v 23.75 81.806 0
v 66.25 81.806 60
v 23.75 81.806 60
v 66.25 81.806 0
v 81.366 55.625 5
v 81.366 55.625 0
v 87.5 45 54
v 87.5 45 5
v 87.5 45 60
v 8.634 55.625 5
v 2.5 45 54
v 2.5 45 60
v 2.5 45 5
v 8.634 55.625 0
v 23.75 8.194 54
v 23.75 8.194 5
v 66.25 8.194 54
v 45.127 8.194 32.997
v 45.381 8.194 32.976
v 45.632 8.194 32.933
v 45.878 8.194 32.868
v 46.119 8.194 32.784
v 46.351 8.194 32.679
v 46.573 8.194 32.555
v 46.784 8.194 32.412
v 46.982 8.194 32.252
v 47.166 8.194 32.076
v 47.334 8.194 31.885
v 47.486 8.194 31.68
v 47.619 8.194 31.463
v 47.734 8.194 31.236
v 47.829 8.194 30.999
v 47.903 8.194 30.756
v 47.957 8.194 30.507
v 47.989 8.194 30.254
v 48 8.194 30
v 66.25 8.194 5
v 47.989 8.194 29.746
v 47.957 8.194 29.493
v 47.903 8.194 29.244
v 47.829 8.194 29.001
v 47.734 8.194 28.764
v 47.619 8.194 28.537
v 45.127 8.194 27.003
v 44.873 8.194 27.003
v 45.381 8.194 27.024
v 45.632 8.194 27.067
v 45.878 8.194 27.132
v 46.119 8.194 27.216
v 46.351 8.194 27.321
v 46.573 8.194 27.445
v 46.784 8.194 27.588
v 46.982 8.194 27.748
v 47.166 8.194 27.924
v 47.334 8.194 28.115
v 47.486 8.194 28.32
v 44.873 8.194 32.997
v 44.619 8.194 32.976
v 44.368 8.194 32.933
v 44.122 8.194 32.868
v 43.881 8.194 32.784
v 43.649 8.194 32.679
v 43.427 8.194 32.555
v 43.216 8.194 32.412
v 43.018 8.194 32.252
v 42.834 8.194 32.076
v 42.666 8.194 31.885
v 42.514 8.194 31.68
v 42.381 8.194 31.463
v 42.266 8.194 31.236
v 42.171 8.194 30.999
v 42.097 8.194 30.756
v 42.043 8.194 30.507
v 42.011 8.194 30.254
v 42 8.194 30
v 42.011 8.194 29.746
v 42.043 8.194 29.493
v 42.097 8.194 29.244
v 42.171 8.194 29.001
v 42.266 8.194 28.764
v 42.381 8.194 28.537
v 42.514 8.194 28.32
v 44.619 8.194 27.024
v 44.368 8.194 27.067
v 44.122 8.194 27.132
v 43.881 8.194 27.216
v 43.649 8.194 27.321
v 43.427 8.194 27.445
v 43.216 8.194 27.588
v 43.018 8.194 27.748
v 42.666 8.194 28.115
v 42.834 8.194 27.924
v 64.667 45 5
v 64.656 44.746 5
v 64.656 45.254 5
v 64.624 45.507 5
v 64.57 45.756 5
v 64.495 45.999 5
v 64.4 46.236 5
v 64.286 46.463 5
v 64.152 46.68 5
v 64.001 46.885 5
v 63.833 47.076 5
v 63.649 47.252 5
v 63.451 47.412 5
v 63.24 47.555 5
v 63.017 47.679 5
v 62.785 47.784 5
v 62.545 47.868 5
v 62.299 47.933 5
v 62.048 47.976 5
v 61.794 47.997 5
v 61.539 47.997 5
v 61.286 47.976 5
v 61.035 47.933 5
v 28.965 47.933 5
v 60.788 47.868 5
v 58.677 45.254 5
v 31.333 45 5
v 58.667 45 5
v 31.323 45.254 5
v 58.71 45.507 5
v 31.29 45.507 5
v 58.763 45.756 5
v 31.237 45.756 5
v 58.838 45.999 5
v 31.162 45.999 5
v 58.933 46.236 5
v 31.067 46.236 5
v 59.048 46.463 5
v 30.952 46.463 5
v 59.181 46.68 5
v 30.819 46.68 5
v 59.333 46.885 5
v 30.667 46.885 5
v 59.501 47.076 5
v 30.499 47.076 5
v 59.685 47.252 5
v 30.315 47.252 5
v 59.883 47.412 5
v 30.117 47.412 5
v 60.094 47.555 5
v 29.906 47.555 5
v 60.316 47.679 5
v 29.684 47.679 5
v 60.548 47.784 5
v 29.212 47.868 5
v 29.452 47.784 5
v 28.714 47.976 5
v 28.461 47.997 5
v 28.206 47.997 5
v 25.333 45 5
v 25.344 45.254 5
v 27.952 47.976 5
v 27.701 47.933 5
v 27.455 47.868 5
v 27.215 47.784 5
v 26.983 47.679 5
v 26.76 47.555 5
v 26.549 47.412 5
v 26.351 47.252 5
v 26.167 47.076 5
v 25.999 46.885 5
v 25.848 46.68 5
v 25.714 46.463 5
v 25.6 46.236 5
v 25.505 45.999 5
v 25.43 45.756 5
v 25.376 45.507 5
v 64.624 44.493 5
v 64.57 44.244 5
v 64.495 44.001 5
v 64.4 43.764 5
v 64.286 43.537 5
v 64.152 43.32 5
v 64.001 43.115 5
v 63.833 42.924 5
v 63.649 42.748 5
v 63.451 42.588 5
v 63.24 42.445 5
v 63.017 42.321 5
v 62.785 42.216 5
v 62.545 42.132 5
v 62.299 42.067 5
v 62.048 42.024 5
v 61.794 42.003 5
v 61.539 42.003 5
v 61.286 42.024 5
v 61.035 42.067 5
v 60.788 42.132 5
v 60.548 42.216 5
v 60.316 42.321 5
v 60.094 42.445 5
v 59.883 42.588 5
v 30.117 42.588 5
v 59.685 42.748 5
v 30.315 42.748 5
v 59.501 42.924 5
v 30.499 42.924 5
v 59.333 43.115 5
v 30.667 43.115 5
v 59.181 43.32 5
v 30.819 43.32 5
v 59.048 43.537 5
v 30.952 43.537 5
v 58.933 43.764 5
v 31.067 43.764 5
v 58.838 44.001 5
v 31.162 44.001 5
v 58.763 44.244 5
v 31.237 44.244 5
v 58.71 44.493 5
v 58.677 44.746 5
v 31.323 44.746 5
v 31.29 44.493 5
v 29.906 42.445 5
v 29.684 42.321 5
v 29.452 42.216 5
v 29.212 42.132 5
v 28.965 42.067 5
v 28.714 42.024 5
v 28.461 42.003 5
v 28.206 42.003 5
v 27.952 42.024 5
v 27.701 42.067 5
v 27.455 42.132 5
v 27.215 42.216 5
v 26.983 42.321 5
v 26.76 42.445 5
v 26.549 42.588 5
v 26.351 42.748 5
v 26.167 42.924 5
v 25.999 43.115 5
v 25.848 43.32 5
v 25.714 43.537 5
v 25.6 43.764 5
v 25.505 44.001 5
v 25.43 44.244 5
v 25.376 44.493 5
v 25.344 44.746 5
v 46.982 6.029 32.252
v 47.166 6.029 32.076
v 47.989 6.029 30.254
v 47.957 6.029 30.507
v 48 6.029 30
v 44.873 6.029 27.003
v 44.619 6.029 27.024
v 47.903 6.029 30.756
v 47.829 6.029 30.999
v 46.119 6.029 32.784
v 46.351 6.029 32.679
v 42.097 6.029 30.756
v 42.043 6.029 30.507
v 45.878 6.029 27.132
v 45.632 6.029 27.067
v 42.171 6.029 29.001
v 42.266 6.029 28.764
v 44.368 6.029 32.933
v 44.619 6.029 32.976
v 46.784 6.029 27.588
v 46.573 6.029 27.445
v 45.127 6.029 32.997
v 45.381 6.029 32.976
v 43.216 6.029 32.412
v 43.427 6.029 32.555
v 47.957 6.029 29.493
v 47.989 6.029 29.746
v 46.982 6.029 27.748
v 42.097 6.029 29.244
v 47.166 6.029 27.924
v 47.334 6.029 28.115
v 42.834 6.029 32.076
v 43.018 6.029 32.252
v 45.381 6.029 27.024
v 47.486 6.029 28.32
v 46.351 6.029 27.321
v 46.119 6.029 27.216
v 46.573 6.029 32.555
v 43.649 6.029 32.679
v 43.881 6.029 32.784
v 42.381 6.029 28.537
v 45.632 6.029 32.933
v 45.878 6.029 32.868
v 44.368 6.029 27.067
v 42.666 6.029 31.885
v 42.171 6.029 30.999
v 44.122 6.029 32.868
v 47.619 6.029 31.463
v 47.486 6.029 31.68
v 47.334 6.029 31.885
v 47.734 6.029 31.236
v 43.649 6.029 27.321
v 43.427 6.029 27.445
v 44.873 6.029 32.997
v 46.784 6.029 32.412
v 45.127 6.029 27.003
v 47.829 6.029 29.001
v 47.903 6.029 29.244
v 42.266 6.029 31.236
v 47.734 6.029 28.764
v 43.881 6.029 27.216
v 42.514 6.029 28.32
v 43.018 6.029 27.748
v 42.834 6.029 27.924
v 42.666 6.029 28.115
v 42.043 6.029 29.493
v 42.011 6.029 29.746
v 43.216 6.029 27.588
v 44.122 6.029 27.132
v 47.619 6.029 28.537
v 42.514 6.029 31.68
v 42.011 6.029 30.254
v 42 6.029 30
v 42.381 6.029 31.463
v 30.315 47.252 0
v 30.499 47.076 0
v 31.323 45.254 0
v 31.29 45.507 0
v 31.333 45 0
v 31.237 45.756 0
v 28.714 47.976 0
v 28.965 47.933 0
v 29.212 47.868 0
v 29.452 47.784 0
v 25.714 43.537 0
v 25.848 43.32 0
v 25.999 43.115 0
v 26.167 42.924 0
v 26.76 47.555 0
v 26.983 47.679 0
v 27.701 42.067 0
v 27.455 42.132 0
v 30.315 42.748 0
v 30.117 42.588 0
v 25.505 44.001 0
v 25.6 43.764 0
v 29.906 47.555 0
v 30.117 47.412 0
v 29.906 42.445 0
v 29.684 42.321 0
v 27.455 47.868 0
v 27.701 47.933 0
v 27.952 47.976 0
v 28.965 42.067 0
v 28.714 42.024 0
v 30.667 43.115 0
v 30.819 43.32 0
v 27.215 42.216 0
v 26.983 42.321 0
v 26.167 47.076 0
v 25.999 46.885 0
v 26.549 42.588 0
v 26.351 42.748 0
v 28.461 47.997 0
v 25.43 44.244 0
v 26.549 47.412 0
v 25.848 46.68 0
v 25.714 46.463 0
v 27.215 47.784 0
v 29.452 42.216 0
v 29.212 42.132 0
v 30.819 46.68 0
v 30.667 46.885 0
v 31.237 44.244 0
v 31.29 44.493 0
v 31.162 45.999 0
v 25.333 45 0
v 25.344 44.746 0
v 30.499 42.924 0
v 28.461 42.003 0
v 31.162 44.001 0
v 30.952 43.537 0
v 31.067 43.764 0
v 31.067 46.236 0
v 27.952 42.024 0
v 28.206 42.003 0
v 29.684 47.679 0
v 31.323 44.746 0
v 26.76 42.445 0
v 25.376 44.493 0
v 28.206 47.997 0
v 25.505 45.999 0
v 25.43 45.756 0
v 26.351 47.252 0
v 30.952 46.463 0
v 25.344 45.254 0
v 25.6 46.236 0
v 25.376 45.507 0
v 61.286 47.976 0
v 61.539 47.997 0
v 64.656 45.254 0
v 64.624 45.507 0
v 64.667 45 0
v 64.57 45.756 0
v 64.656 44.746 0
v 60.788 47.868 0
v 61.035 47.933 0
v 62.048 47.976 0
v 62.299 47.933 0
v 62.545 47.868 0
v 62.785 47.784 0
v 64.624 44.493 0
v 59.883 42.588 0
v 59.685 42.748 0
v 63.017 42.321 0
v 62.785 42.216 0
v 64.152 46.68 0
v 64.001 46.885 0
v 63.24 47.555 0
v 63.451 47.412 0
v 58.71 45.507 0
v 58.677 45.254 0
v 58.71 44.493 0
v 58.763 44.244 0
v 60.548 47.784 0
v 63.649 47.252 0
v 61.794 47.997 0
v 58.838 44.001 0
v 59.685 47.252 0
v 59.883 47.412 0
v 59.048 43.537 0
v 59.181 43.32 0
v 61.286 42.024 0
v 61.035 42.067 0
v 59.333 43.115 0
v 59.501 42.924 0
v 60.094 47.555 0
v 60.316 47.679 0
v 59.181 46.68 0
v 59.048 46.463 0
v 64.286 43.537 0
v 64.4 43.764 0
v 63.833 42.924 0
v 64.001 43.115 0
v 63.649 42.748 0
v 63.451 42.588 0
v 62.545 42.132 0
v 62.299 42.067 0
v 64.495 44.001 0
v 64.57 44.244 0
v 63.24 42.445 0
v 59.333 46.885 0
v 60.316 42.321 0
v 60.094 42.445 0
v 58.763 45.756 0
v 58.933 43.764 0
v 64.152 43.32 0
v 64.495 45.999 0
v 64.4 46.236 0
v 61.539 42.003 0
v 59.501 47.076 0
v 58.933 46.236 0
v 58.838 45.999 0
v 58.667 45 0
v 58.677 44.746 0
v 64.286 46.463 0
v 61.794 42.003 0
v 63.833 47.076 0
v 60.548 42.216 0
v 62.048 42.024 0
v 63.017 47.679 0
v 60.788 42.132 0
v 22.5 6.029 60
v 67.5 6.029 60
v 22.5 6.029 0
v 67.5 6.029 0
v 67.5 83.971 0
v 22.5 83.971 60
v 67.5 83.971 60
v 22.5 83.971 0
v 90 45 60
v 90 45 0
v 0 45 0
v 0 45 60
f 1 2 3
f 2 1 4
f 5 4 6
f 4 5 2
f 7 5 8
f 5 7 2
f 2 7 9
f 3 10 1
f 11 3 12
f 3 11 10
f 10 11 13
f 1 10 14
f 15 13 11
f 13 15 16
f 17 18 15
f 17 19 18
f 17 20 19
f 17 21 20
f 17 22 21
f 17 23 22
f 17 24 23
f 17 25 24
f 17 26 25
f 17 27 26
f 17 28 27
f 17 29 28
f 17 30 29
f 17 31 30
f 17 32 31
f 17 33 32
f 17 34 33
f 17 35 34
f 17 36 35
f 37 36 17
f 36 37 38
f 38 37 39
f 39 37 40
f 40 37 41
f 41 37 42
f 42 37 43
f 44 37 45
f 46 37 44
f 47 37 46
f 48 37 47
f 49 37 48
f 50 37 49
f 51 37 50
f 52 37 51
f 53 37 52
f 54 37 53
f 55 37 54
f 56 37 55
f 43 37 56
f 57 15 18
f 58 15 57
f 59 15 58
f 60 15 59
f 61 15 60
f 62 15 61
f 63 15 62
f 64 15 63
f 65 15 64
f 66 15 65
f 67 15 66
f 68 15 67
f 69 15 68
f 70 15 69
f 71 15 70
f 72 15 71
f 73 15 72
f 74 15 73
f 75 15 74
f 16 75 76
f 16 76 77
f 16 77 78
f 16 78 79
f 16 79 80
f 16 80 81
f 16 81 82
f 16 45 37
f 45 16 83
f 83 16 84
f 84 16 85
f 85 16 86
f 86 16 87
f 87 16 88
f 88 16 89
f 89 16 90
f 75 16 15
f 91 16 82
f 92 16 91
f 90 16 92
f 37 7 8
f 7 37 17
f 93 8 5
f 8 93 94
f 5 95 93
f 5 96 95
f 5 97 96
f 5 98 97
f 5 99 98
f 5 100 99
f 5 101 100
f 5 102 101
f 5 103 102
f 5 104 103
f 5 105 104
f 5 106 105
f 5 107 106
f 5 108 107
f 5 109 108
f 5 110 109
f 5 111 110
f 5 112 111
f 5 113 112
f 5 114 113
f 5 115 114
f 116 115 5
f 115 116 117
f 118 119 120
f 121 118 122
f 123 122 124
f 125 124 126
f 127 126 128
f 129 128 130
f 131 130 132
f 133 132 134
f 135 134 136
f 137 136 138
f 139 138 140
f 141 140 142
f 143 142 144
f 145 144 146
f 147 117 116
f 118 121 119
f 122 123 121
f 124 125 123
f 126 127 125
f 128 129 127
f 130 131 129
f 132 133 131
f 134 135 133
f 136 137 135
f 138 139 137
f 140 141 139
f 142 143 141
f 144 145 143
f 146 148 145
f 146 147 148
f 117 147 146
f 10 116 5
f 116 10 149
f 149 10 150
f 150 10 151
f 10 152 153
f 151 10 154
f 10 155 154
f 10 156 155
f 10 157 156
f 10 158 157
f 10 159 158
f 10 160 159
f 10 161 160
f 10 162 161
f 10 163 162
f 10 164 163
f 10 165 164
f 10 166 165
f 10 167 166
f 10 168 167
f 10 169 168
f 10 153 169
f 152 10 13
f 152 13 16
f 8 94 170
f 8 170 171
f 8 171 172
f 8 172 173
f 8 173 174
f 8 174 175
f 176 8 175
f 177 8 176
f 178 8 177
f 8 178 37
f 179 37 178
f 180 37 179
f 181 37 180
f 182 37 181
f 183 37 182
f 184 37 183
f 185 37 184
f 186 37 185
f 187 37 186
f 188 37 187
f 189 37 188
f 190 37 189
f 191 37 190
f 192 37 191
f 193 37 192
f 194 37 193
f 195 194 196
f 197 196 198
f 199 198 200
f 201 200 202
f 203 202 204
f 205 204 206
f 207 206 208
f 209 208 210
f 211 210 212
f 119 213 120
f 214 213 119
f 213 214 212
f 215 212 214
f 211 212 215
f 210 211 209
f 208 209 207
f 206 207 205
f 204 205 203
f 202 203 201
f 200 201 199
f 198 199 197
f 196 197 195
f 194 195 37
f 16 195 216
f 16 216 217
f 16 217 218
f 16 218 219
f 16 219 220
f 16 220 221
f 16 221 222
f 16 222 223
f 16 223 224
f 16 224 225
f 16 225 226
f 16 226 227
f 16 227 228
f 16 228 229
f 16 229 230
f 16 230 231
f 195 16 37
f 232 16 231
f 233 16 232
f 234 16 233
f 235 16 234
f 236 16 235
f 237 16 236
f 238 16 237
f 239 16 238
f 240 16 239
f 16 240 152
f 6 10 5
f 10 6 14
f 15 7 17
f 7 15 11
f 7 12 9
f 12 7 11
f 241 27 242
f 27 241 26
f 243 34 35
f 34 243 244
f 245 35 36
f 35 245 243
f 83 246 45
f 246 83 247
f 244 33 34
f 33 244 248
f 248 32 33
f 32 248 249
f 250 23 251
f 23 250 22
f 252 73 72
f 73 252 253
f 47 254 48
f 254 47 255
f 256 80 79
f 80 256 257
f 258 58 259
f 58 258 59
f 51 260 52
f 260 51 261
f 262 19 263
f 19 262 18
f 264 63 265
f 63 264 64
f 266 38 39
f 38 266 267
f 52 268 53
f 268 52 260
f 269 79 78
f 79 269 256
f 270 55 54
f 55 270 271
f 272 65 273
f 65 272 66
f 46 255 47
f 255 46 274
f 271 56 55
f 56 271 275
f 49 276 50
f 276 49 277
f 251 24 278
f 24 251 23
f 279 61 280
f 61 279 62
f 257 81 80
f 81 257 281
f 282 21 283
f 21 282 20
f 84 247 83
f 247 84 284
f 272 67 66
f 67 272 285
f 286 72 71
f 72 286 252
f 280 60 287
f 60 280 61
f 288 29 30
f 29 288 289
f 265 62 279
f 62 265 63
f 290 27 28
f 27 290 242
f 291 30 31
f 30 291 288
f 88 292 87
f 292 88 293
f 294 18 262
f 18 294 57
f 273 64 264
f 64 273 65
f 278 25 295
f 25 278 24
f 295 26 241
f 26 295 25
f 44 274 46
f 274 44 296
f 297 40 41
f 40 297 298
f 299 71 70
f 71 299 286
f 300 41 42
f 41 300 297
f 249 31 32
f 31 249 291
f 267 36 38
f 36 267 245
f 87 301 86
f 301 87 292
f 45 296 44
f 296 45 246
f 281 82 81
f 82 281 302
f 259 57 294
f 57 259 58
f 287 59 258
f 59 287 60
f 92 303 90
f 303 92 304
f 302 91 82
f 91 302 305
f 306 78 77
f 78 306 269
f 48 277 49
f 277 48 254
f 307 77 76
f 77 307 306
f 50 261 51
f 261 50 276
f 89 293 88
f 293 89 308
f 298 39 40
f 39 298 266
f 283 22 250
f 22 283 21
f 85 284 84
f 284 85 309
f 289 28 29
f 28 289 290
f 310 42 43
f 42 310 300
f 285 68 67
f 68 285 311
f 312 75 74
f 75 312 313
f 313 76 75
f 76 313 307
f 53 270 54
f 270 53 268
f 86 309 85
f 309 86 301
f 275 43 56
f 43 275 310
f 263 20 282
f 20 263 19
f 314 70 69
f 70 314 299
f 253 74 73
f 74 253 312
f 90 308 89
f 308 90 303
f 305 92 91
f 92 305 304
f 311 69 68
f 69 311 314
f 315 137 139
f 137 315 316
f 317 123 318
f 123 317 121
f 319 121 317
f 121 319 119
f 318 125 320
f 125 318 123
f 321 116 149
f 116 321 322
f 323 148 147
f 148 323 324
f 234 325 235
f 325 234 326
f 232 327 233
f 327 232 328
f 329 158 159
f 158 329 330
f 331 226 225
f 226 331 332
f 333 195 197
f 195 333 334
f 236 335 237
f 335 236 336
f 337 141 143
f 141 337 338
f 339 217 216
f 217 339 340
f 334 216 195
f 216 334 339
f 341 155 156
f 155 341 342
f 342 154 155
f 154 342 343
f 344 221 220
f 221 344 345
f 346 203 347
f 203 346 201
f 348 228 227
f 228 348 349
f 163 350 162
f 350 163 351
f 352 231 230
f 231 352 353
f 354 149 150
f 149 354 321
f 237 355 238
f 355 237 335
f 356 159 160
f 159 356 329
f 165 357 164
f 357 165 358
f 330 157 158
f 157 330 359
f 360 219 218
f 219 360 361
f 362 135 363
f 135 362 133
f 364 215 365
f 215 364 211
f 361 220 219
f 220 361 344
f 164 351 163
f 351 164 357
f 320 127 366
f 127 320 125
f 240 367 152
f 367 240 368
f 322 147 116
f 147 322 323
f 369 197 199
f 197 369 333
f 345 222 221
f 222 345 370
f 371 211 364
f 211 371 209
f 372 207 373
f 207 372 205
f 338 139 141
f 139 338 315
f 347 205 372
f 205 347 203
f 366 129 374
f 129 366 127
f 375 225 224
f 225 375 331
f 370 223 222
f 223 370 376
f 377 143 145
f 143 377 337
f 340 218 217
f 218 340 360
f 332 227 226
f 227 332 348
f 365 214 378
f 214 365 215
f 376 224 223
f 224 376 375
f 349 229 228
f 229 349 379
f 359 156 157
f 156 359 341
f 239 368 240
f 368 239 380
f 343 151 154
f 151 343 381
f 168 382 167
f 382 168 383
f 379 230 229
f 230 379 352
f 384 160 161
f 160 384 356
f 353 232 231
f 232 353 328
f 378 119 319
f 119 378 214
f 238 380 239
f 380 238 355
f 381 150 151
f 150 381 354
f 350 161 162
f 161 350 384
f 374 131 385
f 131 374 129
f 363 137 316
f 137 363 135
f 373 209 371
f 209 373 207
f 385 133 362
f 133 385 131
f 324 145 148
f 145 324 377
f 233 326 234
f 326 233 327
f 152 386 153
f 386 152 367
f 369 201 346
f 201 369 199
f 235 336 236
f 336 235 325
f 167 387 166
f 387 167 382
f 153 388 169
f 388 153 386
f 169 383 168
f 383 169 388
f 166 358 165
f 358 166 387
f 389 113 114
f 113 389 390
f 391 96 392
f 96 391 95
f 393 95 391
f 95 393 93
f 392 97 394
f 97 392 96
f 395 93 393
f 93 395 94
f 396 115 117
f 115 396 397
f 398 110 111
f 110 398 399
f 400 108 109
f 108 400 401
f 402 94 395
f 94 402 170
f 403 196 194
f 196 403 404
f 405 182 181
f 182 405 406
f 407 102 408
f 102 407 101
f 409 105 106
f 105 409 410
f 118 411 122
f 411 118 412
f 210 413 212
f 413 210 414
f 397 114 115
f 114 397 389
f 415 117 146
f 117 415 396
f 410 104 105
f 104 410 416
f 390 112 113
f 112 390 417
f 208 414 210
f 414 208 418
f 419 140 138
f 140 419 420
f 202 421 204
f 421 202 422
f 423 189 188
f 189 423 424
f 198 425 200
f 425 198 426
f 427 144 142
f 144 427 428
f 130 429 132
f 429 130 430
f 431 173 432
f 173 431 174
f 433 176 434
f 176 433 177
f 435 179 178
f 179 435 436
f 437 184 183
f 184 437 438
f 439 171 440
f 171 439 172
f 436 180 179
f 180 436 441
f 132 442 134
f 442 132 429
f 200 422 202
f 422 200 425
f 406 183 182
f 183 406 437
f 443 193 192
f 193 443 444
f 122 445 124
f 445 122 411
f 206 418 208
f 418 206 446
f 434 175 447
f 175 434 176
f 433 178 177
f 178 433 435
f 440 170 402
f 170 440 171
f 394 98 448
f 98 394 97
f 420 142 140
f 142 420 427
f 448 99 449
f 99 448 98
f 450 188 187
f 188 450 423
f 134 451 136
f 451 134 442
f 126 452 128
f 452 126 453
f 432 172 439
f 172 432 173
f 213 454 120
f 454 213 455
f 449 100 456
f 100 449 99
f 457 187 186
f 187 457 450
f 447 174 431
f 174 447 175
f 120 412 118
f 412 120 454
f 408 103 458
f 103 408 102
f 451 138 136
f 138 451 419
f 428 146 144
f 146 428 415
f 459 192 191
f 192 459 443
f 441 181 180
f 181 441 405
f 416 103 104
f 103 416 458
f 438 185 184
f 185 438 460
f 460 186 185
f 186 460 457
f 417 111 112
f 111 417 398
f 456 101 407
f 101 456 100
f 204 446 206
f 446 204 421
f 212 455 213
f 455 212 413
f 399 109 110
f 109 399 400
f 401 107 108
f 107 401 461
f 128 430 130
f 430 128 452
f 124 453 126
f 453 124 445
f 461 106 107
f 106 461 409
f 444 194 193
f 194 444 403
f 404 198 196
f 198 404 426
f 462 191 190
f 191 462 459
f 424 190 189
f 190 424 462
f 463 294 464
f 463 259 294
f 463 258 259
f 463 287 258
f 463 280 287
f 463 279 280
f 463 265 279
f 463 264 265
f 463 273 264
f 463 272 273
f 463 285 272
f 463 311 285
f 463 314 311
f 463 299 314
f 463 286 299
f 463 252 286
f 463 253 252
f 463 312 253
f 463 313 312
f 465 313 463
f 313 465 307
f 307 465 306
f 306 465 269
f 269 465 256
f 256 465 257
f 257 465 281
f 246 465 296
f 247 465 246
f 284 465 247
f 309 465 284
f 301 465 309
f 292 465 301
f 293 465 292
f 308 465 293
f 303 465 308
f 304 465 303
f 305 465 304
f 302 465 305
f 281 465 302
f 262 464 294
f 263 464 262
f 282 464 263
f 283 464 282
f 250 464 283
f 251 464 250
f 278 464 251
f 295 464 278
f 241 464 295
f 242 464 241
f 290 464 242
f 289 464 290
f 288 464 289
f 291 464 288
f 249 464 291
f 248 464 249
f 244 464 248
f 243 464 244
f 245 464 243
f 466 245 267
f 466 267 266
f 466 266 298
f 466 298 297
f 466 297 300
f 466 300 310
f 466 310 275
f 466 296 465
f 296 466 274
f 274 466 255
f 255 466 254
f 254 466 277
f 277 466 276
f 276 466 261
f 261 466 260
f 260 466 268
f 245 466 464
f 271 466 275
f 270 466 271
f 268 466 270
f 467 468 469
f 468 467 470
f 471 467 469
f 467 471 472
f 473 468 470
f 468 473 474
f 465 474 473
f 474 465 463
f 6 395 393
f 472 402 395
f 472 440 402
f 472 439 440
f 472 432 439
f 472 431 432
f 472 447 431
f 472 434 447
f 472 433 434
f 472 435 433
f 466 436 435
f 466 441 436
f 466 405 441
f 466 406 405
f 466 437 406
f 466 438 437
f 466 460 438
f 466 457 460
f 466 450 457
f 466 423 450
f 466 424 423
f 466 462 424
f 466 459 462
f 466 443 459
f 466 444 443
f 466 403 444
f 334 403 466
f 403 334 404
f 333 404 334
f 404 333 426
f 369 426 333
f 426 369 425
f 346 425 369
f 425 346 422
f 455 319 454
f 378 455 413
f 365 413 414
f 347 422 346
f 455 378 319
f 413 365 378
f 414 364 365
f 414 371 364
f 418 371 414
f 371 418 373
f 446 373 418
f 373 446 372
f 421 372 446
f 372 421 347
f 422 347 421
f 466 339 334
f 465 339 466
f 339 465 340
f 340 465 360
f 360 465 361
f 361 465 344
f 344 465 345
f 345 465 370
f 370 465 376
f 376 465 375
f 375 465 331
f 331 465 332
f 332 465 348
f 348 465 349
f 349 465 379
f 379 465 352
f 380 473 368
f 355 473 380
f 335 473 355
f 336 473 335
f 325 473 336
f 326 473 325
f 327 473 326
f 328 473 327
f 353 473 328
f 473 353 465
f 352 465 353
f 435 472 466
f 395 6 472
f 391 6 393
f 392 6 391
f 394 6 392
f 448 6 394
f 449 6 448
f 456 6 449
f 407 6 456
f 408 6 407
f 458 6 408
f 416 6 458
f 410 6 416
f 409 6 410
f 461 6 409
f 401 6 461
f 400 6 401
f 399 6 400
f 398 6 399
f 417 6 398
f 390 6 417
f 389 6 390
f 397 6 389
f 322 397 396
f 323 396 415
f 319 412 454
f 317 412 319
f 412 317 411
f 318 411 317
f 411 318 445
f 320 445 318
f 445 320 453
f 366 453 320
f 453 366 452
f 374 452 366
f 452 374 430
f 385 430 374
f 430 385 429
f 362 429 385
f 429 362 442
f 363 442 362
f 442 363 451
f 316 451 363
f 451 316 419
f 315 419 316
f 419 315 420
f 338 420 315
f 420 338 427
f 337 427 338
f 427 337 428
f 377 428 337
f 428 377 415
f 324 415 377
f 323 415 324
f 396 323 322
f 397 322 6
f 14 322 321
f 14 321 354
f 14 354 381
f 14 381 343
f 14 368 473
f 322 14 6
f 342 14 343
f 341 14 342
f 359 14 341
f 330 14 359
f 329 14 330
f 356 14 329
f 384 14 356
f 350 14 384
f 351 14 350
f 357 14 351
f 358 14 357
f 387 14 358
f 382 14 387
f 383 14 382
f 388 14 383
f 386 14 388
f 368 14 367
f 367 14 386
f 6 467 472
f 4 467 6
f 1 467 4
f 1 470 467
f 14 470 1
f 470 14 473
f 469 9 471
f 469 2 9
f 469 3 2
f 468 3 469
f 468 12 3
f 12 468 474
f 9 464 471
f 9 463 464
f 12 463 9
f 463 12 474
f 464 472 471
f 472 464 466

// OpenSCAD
////////////
x= 90;
z = 60;
hoyo_agua = 6; // diametro
/////////////
hoyos = 6; // diametro
dist_pared =5;

dim_2 = x-dist_pared;
dis_2 = dist_pared/ 2;


j = dim_2/ 3 ;
k=dim_2/8;


p1 = [x/2,(x/2),0];
p2 = [x/2,(x/2),-1];

/////////cubo bace 
c1x =dim_2;
c1y =(dim_2/2)+k ;//-3
c1z = dist_pared+2;
p3 = [dis_2,dis_2,-2];
/////////cubo altura
c2x =dim_2;
c2y =(dim_2/2);
c2z = dist_pared+3;
p4 = [dis_2,dis_2,z-dist_pared-1];

z2c = z /2;
p5 = [(x/2),(x/2),(z/2)]; // (z/2)

p6=[j,x/2,-2];
p7=[x-j,x/2,-2];

$fn = 74;

module f_C()
{
    difference()
    {
translate(p2)
    color("blue")
cylinder(h = z+2 ,d =dim_2,$fn =6);
    
translate(p3)
    color("red")
cube([c1x,c1y,c1z]);
    
translate(p4)
    color("red")
cube([c2x,c2y,c2z]);
    }
    
    
  translate(p5)
   rotate([90,0,0])
  cylinder(h =(x/2), d=hoyo_agua  );  
  
  translate(p6)  
  cylinder(h =z/2, d=hoyos  ); 
   
   translate(p7)  
  cylinder(h =z/2, d=hoyos  ); 
  
}

difference()
{
translate(p1)
cylinder(h = z ,d =x,$fn =6);
f_C();
}


//text1 = "opcion ";
//fond
